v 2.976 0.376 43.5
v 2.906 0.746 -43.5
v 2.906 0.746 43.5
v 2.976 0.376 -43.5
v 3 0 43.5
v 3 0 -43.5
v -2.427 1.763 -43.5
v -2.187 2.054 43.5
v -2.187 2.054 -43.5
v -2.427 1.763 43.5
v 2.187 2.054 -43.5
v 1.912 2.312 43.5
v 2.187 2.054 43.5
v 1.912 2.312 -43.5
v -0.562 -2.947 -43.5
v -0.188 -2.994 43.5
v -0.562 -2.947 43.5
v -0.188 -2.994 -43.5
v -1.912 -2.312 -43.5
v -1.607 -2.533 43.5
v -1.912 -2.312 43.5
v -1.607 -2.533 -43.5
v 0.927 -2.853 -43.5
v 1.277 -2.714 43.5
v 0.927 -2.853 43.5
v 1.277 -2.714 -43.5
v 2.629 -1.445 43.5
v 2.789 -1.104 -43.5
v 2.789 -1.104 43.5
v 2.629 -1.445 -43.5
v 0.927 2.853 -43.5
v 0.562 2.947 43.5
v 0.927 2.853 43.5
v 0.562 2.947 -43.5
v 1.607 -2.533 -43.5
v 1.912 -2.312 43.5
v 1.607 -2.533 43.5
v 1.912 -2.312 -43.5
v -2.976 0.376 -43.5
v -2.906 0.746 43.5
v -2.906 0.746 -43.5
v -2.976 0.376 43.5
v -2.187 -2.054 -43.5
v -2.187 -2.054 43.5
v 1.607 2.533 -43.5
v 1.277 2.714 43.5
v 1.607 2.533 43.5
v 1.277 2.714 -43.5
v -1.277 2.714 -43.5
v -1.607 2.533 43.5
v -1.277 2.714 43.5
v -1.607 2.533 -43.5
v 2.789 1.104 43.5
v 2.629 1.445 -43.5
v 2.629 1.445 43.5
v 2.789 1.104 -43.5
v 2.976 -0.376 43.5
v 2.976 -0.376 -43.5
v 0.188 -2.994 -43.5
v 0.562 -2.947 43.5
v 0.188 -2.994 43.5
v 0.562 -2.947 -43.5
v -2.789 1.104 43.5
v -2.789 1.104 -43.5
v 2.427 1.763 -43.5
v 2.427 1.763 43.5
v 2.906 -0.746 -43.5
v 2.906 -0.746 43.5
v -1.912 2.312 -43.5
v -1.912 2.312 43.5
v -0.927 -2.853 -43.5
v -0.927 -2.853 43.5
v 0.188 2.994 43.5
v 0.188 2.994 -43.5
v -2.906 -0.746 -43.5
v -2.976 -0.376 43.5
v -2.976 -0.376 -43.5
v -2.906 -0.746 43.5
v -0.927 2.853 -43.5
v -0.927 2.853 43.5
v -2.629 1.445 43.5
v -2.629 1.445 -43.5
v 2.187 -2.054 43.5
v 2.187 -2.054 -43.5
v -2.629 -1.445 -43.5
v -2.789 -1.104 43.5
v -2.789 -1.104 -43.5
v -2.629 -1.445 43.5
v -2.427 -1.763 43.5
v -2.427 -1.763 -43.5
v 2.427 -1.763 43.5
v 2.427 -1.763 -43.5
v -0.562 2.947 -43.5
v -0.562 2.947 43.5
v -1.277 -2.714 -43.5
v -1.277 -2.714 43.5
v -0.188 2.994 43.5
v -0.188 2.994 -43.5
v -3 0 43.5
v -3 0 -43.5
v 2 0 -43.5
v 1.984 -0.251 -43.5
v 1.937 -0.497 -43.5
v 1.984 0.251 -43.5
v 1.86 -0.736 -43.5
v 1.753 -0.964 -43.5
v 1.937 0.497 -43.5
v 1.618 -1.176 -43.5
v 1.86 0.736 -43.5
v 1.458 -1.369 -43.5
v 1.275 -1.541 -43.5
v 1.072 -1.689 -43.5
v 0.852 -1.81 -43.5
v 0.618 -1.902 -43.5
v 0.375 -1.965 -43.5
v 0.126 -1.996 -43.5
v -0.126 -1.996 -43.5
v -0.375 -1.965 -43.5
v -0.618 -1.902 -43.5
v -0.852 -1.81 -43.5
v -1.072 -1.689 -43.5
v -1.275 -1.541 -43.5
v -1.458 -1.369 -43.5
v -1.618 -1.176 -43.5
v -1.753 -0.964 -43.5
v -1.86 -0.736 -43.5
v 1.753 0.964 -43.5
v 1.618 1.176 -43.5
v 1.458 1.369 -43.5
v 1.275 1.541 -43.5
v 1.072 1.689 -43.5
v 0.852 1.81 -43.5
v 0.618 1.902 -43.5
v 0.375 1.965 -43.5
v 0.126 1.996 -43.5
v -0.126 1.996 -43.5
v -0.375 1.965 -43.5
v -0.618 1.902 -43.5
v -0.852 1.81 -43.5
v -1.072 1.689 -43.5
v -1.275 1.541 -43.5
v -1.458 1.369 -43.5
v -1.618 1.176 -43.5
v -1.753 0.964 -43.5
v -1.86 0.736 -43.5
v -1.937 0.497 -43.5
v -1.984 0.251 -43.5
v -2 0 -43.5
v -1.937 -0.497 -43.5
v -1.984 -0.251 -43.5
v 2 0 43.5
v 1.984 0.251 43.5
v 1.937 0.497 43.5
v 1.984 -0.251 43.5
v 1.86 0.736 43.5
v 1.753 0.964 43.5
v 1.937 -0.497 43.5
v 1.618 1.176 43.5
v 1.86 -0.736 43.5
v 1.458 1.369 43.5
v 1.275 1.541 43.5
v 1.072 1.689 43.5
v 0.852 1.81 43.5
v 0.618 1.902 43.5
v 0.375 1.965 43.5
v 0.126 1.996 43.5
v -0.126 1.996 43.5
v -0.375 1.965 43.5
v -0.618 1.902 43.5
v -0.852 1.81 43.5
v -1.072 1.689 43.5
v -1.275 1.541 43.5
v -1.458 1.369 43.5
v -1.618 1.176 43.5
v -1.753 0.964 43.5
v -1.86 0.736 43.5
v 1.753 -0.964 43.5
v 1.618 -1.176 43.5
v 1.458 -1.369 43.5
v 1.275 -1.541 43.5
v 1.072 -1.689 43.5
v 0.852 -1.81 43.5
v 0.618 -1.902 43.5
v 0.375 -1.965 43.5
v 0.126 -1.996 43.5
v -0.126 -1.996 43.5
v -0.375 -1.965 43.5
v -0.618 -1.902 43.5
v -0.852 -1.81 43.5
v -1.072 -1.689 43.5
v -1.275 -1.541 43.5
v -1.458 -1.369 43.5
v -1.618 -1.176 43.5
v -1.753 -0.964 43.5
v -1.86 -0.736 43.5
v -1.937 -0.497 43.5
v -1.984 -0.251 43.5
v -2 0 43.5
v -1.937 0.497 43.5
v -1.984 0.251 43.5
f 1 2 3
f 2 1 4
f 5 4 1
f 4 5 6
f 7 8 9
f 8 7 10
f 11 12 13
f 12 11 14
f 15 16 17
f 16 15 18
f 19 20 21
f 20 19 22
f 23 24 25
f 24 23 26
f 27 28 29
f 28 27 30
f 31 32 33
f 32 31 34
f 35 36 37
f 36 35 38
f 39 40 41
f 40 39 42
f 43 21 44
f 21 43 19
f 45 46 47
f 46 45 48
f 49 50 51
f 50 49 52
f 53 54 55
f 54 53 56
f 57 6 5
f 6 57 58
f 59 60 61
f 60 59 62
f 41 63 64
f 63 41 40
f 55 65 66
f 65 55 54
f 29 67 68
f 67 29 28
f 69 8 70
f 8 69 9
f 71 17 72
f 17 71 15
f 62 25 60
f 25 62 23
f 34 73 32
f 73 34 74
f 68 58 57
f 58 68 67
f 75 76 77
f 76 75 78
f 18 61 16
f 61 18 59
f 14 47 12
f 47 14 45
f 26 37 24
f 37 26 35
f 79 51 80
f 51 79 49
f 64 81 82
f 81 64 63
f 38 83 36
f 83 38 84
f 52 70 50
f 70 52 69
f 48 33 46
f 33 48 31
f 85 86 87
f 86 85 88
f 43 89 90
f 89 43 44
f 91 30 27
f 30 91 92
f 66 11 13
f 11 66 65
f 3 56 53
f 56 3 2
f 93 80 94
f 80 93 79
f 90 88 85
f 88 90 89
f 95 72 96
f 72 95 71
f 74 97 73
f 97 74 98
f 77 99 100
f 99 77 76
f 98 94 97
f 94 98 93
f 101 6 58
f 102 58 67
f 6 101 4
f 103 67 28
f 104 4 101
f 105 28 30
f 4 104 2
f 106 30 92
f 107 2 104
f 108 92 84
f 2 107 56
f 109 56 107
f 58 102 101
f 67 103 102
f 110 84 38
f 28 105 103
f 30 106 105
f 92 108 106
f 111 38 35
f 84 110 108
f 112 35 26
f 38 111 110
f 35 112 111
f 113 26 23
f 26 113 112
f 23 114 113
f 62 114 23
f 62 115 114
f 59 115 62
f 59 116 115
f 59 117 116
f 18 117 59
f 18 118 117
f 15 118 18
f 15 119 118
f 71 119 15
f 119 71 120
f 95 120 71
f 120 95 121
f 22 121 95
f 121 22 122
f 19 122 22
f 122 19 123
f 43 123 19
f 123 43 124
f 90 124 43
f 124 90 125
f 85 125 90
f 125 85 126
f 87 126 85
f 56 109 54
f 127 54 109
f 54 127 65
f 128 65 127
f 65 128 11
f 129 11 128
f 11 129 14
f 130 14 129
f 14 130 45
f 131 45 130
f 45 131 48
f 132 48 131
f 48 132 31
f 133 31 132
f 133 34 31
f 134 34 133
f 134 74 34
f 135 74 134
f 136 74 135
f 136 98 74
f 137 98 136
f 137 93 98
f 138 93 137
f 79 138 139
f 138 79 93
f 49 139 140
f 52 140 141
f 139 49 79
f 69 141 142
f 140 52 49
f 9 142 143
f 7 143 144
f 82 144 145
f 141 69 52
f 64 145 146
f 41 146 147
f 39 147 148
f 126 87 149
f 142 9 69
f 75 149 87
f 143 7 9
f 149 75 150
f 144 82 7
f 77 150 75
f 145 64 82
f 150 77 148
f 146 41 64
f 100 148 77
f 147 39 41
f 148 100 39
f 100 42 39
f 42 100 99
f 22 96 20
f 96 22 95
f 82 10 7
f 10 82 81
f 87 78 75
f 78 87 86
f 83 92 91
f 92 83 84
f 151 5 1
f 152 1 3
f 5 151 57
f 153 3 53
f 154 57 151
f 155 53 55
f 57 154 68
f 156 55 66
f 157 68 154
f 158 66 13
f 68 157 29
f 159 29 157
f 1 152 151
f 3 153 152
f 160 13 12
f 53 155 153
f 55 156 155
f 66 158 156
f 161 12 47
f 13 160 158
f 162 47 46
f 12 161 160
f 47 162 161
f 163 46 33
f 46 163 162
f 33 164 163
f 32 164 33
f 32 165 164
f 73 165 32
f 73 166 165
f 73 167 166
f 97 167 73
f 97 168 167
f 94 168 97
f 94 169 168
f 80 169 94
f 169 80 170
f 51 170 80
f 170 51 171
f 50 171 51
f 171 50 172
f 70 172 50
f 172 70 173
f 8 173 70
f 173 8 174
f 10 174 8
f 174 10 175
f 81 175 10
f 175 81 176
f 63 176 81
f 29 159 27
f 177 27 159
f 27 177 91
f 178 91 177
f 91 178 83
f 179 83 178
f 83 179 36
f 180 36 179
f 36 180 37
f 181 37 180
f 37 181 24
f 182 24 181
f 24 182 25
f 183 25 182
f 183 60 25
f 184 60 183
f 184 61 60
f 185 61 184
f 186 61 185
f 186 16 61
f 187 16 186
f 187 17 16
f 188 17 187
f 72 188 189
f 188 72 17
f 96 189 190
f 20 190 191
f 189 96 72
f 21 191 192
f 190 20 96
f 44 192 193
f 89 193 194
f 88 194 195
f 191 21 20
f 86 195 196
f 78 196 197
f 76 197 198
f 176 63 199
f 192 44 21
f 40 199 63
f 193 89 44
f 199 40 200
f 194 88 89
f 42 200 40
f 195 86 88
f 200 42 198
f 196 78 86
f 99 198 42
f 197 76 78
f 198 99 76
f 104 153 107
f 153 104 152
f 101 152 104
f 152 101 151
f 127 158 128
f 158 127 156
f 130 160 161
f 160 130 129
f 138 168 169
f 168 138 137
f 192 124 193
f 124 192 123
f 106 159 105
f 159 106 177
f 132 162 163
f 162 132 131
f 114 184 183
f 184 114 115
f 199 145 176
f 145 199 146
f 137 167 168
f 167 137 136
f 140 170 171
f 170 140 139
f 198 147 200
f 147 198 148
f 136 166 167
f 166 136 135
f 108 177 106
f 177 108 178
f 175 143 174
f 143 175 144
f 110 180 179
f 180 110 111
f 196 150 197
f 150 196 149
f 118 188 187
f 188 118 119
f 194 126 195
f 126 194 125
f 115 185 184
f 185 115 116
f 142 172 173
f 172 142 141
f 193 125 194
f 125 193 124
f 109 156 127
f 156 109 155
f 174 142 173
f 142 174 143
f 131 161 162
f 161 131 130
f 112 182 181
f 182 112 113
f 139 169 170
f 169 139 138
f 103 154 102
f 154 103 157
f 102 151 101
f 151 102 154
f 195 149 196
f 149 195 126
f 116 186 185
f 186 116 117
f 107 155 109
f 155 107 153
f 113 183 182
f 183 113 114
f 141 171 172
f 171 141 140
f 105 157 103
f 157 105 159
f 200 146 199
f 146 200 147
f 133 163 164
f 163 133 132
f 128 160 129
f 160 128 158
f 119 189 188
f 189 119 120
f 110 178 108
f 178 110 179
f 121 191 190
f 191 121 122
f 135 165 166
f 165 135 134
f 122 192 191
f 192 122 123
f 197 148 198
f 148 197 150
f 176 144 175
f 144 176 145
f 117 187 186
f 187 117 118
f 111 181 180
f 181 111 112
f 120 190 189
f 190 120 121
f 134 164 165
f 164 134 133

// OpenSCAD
$fn = 50;


difference() {
	union() {
		translate(v = [0, 0, -43.5000000000]) {
			cylinder(h = 87, r = 3.0000000000);
		}
	}
	union() {
		translate(v = [0, 0, -100.0000000000]) {
			cylinder(h = 200, r = 2.0000000000);
		}
	}
}
